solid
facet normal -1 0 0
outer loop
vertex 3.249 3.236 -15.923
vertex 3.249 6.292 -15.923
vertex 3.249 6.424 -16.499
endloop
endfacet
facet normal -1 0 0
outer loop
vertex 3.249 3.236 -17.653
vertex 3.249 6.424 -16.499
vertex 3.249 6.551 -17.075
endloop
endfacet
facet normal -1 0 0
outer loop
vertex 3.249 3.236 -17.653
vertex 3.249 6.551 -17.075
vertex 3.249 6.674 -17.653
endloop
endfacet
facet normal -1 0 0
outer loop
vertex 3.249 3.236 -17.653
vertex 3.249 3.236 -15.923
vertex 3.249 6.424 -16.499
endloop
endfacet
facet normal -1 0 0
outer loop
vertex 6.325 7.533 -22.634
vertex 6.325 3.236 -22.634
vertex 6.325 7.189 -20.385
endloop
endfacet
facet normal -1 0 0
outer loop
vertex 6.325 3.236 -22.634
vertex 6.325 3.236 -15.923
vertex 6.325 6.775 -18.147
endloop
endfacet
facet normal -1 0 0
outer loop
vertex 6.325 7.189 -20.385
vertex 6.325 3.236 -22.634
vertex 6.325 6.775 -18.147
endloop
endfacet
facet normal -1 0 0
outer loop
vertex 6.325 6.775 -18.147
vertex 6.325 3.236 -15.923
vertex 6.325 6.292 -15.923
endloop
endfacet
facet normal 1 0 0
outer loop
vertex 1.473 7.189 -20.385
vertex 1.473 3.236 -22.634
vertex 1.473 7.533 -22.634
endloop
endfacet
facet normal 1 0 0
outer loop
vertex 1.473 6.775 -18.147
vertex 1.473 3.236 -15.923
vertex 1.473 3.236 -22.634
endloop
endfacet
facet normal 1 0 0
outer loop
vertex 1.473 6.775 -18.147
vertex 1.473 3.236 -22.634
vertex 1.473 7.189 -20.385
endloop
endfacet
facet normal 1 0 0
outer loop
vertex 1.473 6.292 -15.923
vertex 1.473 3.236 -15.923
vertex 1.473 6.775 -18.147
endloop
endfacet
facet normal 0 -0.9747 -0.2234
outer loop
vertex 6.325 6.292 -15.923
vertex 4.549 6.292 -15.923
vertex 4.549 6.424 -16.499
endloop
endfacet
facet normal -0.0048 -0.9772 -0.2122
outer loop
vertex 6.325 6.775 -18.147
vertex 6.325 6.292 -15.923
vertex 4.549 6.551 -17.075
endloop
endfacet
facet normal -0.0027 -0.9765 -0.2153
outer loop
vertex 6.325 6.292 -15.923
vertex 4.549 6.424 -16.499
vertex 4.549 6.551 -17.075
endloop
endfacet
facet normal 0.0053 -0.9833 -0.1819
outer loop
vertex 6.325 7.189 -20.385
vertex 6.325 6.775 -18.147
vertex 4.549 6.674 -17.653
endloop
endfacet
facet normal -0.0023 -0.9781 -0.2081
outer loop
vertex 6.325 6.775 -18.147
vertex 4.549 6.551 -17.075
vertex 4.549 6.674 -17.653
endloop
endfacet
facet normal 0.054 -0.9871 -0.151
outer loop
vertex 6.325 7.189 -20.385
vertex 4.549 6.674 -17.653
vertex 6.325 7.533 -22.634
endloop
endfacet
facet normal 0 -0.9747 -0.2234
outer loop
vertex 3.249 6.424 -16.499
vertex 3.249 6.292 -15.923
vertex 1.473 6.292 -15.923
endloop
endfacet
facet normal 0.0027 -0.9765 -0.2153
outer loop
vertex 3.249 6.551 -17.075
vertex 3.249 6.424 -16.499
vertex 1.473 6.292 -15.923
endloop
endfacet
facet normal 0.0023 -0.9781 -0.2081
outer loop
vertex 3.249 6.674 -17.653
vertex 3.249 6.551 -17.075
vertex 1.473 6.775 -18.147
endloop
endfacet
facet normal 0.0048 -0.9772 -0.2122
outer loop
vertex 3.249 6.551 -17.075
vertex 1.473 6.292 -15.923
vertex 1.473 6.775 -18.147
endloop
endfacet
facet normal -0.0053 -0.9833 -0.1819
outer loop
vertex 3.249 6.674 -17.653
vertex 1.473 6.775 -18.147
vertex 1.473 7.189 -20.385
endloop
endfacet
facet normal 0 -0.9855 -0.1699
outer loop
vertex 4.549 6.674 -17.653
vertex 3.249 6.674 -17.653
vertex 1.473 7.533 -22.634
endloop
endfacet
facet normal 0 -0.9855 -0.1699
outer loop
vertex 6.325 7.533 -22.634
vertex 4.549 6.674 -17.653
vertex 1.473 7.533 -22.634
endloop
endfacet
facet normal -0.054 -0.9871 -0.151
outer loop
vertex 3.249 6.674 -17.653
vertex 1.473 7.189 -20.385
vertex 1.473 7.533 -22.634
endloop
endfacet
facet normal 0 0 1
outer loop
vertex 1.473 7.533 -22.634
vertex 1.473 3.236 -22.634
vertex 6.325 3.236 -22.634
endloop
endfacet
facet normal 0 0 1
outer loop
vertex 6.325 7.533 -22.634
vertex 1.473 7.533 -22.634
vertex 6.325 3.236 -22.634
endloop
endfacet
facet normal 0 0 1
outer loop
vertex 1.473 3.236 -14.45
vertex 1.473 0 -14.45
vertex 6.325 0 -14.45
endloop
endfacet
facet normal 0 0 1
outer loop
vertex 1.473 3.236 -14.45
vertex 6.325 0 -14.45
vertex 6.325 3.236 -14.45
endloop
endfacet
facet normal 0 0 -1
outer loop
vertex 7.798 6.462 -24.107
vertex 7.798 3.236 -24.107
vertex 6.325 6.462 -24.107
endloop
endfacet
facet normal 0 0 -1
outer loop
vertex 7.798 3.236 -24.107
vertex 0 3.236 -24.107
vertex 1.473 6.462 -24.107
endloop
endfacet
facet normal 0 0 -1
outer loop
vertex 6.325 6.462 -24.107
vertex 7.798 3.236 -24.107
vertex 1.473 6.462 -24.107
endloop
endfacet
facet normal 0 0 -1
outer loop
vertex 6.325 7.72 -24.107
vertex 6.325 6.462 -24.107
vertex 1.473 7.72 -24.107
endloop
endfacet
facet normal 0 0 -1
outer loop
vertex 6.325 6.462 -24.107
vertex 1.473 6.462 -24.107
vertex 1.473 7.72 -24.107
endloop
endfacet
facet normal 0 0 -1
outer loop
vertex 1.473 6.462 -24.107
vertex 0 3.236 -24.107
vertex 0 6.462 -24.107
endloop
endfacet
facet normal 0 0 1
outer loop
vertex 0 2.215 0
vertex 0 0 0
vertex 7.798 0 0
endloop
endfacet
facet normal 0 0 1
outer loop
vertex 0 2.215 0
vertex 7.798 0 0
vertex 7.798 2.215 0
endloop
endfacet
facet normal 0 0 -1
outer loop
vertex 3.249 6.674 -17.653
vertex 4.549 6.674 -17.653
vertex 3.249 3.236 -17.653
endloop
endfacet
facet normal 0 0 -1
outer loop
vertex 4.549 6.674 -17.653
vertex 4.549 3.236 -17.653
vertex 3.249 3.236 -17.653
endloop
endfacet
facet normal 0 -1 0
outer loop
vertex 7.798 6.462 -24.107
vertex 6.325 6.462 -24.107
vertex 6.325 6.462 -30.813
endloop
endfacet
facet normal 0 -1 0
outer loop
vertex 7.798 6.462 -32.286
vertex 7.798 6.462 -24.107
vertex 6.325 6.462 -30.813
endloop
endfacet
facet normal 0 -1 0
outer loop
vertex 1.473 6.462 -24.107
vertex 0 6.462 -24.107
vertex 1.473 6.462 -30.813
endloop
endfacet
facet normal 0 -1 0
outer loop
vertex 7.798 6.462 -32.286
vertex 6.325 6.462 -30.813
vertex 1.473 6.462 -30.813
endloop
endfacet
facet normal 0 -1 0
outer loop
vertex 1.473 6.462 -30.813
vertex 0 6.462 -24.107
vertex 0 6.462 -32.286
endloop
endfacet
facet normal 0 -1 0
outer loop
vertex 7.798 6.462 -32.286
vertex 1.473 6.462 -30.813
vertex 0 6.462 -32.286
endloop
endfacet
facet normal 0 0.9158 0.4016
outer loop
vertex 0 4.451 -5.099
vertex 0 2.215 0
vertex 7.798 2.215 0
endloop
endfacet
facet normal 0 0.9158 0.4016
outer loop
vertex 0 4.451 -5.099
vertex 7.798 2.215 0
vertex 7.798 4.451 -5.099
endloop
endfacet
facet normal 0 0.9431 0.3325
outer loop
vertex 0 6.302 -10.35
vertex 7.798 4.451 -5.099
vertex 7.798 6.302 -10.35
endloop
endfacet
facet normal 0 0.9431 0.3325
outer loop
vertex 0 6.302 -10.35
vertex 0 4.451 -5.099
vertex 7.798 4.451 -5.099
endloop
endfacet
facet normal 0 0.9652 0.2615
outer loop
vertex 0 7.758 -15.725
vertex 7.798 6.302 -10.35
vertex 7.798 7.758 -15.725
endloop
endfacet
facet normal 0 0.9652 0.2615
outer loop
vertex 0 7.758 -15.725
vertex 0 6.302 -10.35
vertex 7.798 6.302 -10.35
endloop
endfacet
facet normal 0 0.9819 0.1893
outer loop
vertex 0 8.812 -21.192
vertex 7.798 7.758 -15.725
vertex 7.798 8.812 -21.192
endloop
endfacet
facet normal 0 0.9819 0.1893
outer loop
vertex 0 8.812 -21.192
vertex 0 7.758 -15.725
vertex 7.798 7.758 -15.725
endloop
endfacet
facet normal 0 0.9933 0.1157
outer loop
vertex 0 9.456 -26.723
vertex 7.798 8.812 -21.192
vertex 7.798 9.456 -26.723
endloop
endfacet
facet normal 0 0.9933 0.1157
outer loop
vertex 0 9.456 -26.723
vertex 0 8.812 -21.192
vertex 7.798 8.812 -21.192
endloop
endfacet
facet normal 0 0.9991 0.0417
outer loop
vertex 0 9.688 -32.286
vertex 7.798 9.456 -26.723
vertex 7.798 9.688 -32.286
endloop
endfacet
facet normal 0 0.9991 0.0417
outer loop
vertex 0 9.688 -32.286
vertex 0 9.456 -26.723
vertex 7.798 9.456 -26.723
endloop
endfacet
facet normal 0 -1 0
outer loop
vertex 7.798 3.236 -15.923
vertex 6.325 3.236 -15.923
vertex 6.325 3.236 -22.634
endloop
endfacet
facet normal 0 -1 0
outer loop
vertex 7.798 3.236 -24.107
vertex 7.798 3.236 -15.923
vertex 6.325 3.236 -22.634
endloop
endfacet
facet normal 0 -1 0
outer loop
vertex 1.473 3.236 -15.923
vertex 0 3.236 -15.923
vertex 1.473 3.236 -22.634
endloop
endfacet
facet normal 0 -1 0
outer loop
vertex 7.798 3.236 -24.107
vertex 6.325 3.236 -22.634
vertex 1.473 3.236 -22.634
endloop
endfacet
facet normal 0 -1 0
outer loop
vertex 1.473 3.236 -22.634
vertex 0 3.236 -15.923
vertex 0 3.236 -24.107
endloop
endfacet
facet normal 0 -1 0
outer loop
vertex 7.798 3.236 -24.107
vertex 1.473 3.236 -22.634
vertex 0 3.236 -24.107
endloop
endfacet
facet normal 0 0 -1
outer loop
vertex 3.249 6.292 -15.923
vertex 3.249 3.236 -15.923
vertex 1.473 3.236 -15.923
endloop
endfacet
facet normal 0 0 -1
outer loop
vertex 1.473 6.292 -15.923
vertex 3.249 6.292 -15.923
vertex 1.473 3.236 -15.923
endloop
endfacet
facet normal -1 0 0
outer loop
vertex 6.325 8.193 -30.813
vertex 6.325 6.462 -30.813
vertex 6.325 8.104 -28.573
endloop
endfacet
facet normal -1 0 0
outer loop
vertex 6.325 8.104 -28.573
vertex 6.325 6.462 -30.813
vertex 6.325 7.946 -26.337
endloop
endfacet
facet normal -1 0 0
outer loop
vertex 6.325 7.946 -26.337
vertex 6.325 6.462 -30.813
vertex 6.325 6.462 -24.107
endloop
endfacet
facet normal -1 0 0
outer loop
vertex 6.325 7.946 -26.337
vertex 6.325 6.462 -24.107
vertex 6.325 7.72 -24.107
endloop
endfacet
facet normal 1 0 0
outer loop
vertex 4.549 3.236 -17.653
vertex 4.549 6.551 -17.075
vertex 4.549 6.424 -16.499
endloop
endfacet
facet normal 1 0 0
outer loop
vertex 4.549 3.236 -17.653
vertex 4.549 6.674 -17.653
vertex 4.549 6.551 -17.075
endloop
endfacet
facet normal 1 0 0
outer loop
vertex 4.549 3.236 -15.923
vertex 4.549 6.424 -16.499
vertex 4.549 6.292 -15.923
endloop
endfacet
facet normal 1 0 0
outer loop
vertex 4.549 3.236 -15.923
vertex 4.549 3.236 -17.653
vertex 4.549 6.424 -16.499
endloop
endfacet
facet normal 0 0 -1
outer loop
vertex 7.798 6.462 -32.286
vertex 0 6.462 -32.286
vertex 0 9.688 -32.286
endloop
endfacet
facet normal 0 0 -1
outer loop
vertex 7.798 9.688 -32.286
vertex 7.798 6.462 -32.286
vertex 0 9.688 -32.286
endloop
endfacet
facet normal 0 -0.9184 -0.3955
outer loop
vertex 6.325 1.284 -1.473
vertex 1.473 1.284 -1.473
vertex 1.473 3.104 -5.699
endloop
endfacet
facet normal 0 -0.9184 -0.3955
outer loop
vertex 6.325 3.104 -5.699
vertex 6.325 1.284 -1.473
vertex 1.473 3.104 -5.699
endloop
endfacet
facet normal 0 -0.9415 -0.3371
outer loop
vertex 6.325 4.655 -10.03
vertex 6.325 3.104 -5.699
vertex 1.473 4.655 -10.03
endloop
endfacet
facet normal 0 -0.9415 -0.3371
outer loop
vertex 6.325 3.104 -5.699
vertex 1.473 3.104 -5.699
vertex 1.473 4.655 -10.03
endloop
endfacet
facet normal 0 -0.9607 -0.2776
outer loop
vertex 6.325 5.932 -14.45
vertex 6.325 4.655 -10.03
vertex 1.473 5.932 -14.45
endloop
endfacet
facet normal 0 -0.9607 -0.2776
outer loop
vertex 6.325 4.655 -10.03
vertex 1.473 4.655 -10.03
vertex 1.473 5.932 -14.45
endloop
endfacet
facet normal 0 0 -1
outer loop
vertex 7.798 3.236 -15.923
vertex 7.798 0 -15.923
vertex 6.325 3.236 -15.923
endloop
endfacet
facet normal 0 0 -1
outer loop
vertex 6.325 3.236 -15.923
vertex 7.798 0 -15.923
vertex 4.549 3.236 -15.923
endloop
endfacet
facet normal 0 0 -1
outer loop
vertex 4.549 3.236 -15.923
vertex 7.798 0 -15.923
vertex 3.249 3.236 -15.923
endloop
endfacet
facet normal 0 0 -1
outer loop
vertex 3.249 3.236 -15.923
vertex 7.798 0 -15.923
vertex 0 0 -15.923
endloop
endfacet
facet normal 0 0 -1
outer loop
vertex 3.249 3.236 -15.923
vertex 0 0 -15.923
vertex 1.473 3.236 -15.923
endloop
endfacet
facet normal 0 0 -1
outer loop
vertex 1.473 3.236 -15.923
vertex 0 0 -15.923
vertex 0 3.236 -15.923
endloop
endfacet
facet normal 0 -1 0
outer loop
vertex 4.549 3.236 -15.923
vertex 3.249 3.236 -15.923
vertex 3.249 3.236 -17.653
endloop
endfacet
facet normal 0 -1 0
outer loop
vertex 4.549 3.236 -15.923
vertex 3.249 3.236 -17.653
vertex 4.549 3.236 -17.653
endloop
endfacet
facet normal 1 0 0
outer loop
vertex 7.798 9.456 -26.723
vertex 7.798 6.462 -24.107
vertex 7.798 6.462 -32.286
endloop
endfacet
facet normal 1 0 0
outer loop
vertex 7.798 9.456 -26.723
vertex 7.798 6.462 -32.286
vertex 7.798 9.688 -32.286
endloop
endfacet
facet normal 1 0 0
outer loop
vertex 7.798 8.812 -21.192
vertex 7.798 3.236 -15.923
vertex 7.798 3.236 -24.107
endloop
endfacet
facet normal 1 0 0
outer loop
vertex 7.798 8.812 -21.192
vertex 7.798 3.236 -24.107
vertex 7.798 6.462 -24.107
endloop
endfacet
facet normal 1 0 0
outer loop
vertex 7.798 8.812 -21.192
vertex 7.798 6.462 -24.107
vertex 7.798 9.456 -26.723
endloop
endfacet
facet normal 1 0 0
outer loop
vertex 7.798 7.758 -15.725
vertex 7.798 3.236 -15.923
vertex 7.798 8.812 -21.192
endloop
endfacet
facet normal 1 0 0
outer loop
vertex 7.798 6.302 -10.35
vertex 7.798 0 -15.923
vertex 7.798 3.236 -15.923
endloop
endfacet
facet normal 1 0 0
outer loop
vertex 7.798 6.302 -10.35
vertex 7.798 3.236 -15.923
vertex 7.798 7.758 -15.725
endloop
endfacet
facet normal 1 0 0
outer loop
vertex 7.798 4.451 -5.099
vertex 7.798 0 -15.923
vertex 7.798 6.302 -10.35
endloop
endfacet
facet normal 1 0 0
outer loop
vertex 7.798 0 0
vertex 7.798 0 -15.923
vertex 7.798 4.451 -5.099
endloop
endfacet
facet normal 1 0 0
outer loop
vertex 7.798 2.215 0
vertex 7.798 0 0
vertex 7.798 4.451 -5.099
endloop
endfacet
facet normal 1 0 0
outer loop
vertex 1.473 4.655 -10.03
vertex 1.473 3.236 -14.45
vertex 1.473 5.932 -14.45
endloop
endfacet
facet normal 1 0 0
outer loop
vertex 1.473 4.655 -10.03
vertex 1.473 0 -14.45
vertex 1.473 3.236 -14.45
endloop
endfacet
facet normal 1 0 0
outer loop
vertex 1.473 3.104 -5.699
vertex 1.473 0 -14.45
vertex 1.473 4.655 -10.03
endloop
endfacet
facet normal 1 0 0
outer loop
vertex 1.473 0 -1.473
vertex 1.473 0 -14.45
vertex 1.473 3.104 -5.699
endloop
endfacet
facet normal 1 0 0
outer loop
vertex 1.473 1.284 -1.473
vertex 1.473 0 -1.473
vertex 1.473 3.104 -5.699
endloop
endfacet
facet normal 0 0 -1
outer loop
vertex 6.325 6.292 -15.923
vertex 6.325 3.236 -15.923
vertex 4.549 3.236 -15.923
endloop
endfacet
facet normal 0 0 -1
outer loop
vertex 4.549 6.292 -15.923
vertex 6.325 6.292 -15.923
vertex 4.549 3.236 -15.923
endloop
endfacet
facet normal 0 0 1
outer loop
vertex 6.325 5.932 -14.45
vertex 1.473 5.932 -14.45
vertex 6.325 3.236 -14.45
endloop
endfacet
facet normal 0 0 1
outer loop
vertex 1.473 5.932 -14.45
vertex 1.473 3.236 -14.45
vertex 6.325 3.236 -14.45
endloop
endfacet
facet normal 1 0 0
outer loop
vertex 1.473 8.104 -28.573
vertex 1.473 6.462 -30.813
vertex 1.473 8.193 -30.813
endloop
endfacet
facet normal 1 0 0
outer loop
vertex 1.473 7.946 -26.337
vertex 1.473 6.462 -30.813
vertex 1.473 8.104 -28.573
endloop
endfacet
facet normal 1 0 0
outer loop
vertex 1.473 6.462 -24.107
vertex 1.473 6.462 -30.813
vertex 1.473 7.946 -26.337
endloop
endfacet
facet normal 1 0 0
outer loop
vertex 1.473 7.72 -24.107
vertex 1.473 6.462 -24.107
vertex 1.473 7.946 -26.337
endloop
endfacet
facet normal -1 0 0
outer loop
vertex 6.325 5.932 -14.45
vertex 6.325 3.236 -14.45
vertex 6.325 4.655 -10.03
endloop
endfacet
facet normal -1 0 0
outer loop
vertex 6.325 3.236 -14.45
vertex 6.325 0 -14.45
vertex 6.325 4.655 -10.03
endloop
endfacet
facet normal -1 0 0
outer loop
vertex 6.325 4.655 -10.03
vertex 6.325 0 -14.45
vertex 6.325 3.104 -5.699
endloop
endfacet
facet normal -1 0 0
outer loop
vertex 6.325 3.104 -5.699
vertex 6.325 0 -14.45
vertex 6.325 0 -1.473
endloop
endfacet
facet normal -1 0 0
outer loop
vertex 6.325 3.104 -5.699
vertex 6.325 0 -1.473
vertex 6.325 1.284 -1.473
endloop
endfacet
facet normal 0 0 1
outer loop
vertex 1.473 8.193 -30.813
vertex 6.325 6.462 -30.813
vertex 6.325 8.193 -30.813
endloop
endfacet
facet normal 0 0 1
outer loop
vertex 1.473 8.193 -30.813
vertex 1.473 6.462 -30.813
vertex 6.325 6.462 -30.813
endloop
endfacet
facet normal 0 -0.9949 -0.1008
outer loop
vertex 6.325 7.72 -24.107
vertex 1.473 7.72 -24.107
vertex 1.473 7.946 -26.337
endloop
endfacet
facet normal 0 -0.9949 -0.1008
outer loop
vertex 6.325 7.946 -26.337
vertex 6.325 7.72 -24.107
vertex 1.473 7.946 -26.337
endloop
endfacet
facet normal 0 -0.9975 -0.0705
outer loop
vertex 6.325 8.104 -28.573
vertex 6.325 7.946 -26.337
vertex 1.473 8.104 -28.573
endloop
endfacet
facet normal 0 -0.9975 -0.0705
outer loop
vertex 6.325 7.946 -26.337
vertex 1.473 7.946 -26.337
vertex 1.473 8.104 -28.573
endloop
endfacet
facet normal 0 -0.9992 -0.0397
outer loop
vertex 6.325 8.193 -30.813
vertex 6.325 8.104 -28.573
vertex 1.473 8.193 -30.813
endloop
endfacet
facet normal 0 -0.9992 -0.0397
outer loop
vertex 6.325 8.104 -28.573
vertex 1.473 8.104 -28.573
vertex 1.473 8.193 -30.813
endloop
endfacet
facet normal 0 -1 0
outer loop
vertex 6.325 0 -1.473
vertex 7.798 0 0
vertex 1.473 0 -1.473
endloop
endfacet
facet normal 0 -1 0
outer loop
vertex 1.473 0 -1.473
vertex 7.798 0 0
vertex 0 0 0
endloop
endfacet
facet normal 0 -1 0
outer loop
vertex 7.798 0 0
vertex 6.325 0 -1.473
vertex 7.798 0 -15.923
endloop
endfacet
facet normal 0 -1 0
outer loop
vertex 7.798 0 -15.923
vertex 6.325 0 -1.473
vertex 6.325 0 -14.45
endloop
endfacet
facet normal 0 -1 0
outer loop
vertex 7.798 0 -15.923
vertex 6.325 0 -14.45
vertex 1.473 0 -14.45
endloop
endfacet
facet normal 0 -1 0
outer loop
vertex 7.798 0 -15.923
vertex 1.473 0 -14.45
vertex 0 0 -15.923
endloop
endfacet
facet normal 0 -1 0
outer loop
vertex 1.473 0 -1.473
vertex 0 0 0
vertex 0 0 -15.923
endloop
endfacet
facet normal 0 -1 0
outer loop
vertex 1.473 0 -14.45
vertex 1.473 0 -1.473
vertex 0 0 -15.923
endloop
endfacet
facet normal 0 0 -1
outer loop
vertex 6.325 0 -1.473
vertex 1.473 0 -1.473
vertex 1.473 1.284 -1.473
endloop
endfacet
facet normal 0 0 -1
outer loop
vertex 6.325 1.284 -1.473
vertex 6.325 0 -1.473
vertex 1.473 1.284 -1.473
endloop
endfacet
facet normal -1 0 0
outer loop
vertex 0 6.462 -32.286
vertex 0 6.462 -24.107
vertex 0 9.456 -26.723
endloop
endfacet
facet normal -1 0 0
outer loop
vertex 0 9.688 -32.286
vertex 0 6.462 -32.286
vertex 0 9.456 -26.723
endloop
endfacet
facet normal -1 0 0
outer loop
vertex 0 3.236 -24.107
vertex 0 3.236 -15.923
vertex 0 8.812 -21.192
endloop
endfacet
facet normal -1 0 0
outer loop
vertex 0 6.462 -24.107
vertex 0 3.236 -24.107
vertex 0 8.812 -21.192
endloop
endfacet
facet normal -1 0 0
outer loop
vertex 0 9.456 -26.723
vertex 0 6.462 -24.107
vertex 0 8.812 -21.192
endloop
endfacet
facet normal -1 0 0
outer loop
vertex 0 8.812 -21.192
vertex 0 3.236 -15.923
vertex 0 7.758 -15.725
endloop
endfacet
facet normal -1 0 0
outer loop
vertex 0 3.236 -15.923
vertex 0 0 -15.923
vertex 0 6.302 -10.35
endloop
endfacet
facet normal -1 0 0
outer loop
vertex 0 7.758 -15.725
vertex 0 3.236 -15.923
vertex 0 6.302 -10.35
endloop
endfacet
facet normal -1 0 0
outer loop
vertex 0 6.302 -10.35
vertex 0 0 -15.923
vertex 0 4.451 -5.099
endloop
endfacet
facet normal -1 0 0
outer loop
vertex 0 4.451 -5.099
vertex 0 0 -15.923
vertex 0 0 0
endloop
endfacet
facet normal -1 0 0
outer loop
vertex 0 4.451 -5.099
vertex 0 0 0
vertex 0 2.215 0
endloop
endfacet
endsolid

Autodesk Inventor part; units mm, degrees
ref_plane "YZ Plane" through (0, 0, 0) normal (1, 0, 0) x (0, 1, 0)
ref_plane "XZ Plane" through (0, 0, 0) normal (0, 1, 0) x (-1, 0, 0)
ref_plane "XY Plane" through (0, 0, 0) normal (0, 0, 1) x (1, 0, 0)
sketch "Sketch1" plane through (0, 0, 0) normal (1, 0, 0) x (0, 1, 0)
  line L0 (0, 0) -> (0, -15.9233)
  line L1 (0, -15.9233) -> (3.236, -15.9233)
  line L2 (3.236, -15.9233) -> (3.236, -24.1071)
  line L3 (3.236, -24.1071) -> (6.4618, -24.1071)
  line L4 (6.4618, -24.1071) -> (6.4618, -32.2859)
  line L5 (6.4618, -32.2859) -> (9.6876, -32.2859)
  line L6 (0, 0) -> (2.2149, 0)
  line L7 (9.6876, -32.2859) -> (40.3351, -32.2859) construction
  arc A0 (9.6876, -32.2859) -> (2.2149, 0) centre (-65.2438, -32.6213) ccw
  dimension "d0" = 15.9233
  dimension "d1" = 3.236
  dimension "d2" = 3.2258
  dimension "d3" = 3.2258
  dimension "d4" = 24.1071
  dimension "d5" = 32.2859
  dimension "d6" = 2.2149
extrude "Extrusion1" add sketch "Sketch1" along normal blind 7.7978
shell "Shell1" thickness 1.4732 removed faces 3 at (2.5993, 0, -5.3078) at (2.5993, 3.236, -18.6512) at (2.5993, 6.4618, -26.8334)
sketch "Sketch5" plane through (0, 3.236, -24.1071) normal (0, -1, 0) x (1, 0, 0)
  line L0 (6.3246, 8.1839) -> (7.7978, 8.1839) projected
  line L1 (7.7978, 8.1839) -> (1.4732, 8.1839)
  line L2 (1.4732, 8.1839) -> (1.4732, 9.6571)
  line L3 (1.4732, 9.6571) -> (7.7978, 9.6571)
  line L4 (7.7978, 9.6571) -> (7.7978, 8.1839)
  line L5 (0, 8.1839) -> (1.4732, 8.1839) projected
  line L6 (1.4732, 9.6571) -> (0, 9.6571)
  line L7 (0, 9.6571) -> (0, 8.1839)
  line L8 (0, 8.1839) -> (1.4732, 8.1839)
  line L9 (1.4732, 8.1839) -> (1.4732, 9.6571)
  point P0 (0, 24.1071)
extrude "Extrusion2" add sketch "Sketch5" against normal up to surface
sketch "Sketch8" plane through (0, 3.236, -24.1071) normal (0, -1, 0) x (1, 0, 0)
  line L0 (1.4732, 1.4732) -> (6.3246, 1.4732) projected
  line L1 (6.3246, 1.4732) -> (1.4732, 1.4732)
  line L2 (1.4732, 1.4732) -> (1.4732, 0)
  line L3 (1.4732, 0) -> (6.3246, 0)
  line L4 (6.3246, 0) -> (6.3246, 1.4732)
  point P0 (0, 24.1071)
  point P1 (7.7978, 0)
  point P2 (0, 0)
extrude "Extrusion3" add sketch "Sketch8" against normal up to surface
sketch "Sketch9" plane through (0, 0, -15.9233) normal (0, -1, 0) x (1, 0, 0)
  line L0 (1.4732, -6.7107) -> (1.4732, 0) projected
  line L1 (6.3246, 1.4732) -> (1.4732, 1.4732) projected
  line L2 (1.4732, 1.4732) -> (1.4732, 14.4501) projected
  line L3 (1.4732, 14.4501) -> (6.3246, 14.4501) projected
  line L4 (6.3246, 14.4501) -> (6.3246, 1.4732) projected
  line L5 (0, 15.9233) -> (0, 0) projected
  line L6 (0, 0) -> (7.7978, 0) projected
  line L7 (7.7978, 15.9233) -> (7.7978, 0) projected
  line L8 (0, 15.9233) -> (7.7978, 15.9233) projected
  line L9 (0, -8.1839) -> (7.7978, -8.1839) projected
  line L10 (7.7978, 0) -> (7.7978, -8.1839) projected
  line L11 (6.3246, 0) -> (7.7978, 0) projected
  line L12 (6.3246, 0) -> (6.3246, -6.7107) projected
  line L13 (6.3246, -6.7107) -> (1.4732, -6.7107) projected
  line L14 (1.4732, -6.7107) -> (1.4732, 0) projected
  line L15 (0, 0) -> (1.4732, 0) projected
  line L16 (0, 0) -> (0, -8.1839) projected
  line L17 (1.4732, -14.8895) -> (1.4732, -8.1839) projected
  line L18 (0, -8.1839) -> (1.4732, -8.1839) projected
  line L19 (0, -8.1839) -> (0, -16.3627) projected
  line L20 (0, -16.3627) -> (7.7978, -16.3627) projected
  line L21 (7.7978, -8.1839) -> (7.7978, -16.3627) projected
  line L22 (6.3246, -8.1839) -> (7.7978, -8.1839) projected
  line L23 (6.3246, -8.1839) -> (6.3246, -14.8895) projected
  line L24 (6.3246, -14.8895) -> (1.4732, -14.8895) projected
  line L25 (6.3246, 0) -> (1.4732, 0) projected
  line L26 (6.3246, -6.7107) -> (1.4732, -6.7107) projected
  line L27 (4.5491, -1.7297) -> (3.2487, -1.7297)
  line L28 (3.2487, 0) -> (3.2487, -1.7297)
  line L29 (4.5491, -1.7297) -> (4.5491, 0)
  line L30 (4.5491, 0) -> (3.2487, 0)
extrude "Extrusion4" add sketch "Sketch9" against normal up to next from surface at -3.236 contours L6 L29 L27 L28
properties part number "3x1 curve" material "ABS Plastic"
